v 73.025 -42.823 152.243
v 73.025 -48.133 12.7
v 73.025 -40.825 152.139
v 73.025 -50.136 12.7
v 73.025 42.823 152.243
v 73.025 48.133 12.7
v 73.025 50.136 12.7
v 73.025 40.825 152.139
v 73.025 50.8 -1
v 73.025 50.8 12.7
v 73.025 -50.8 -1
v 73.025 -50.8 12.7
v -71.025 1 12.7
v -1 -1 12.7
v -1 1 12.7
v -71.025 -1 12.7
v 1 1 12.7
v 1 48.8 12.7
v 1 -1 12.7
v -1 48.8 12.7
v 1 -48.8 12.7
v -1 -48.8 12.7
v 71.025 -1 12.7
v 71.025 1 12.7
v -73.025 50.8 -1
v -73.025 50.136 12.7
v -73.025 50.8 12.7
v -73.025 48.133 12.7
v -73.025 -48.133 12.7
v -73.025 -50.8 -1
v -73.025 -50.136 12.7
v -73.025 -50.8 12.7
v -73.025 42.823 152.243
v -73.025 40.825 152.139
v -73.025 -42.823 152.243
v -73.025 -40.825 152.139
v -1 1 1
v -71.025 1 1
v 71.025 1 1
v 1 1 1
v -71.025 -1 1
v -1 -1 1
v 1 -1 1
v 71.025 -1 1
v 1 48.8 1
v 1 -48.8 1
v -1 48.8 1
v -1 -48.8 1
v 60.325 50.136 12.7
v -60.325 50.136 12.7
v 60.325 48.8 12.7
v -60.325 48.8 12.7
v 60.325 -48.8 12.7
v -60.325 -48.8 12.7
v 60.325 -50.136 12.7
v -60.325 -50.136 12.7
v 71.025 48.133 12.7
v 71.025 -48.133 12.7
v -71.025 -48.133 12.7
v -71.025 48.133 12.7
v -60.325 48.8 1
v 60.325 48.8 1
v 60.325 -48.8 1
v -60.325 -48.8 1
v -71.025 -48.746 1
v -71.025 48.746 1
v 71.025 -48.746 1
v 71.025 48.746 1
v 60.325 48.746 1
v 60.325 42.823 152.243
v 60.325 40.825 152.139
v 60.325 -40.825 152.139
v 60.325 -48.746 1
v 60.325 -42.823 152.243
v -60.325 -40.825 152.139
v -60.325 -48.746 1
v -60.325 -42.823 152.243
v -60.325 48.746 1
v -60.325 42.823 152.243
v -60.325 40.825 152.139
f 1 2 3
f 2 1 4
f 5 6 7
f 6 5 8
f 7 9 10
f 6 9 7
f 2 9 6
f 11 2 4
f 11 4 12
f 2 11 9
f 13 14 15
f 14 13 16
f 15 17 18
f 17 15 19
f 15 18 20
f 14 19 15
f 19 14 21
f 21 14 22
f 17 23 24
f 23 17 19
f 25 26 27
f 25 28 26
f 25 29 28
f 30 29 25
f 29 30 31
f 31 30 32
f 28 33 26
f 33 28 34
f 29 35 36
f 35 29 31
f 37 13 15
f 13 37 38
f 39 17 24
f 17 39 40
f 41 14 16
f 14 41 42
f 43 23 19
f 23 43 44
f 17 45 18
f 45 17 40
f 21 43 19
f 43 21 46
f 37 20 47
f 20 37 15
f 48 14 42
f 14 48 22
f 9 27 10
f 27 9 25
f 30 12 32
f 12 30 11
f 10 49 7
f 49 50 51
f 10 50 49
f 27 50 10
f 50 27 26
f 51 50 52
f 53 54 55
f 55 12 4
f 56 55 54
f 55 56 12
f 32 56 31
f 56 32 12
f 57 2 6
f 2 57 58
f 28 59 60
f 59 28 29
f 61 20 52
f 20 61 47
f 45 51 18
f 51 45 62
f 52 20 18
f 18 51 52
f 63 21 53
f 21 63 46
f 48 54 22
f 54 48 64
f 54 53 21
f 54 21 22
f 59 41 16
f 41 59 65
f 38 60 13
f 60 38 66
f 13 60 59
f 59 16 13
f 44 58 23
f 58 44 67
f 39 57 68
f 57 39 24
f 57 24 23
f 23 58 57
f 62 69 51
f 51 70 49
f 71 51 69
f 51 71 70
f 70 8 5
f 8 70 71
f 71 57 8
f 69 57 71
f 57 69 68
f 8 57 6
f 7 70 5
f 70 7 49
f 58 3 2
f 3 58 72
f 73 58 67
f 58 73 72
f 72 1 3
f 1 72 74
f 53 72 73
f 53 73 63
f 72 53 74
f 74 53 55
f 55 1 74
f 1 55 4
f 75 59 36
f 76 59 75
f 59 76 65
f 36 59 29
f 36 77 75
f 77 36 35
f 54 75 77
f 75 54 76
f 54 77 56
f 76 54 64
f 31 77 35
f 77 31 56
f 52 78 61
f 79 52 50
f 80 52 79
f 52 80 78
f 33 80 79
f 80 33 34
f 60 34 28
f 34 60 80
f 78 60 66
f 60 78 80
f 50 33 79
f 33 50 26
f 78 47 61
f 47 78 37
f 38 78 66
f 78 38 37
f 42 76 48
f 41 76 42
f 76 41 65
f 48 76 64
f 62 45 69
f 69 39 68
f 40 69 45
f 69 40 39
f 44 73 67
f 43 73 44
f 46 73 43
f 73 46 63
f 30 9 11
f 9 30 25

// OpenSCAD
// Units are mm.

function i2mm(x) = x * 0.0254 * 1000;

t = 2;

depth = i2mm(4);
width = i2mm(5.75);
h = i2mm(6);

tab_len = i2mm(0.5);
tab_width = i2mm(0.5);

module base_plate() {
    cube(size=[width, depth, t], center=true);
}

module leg(len, angle) {
    rotate([angle, 0, 0])
        translate([0, 0, len / 2])
            cube(size=[tab_width, t, len], center=true);
}

module width_tab() {
    cube(size=[width, t, tab_len], center=true);
}

module depth_tab() {
    cube(size=[t, depth, tab_len], center=true);
}

module tabs() {
    dx = width / 2 - tab_width / 2;
    dy = depth / 2 - t / 2;
    dz = tab_len / 2;
    ext = h - tab_len;
    translate([0, 0, dz]) {
        width_tab();
        depth_tab();
    }
    translate([0, dy, dz])
        width_tab();
    translate([0, -dy, dz])
        width_tab() ;
    translate([-width / 2 + t / 2, 0, dz])
        depth_tab();
    translate([width / 2 - t / 2, 0, dz])
        depth_tab();
    translate([dx, dy, 0])
        leg(h, 3);
    translate([dx, -dy, 0])
        leg(h, -3);
    translate([-dx, -dy, 0])
        leg(h, -3);
    translate([-dx, dy, 0])
        leg(h, 3);
}

base_plate();
tabs();
